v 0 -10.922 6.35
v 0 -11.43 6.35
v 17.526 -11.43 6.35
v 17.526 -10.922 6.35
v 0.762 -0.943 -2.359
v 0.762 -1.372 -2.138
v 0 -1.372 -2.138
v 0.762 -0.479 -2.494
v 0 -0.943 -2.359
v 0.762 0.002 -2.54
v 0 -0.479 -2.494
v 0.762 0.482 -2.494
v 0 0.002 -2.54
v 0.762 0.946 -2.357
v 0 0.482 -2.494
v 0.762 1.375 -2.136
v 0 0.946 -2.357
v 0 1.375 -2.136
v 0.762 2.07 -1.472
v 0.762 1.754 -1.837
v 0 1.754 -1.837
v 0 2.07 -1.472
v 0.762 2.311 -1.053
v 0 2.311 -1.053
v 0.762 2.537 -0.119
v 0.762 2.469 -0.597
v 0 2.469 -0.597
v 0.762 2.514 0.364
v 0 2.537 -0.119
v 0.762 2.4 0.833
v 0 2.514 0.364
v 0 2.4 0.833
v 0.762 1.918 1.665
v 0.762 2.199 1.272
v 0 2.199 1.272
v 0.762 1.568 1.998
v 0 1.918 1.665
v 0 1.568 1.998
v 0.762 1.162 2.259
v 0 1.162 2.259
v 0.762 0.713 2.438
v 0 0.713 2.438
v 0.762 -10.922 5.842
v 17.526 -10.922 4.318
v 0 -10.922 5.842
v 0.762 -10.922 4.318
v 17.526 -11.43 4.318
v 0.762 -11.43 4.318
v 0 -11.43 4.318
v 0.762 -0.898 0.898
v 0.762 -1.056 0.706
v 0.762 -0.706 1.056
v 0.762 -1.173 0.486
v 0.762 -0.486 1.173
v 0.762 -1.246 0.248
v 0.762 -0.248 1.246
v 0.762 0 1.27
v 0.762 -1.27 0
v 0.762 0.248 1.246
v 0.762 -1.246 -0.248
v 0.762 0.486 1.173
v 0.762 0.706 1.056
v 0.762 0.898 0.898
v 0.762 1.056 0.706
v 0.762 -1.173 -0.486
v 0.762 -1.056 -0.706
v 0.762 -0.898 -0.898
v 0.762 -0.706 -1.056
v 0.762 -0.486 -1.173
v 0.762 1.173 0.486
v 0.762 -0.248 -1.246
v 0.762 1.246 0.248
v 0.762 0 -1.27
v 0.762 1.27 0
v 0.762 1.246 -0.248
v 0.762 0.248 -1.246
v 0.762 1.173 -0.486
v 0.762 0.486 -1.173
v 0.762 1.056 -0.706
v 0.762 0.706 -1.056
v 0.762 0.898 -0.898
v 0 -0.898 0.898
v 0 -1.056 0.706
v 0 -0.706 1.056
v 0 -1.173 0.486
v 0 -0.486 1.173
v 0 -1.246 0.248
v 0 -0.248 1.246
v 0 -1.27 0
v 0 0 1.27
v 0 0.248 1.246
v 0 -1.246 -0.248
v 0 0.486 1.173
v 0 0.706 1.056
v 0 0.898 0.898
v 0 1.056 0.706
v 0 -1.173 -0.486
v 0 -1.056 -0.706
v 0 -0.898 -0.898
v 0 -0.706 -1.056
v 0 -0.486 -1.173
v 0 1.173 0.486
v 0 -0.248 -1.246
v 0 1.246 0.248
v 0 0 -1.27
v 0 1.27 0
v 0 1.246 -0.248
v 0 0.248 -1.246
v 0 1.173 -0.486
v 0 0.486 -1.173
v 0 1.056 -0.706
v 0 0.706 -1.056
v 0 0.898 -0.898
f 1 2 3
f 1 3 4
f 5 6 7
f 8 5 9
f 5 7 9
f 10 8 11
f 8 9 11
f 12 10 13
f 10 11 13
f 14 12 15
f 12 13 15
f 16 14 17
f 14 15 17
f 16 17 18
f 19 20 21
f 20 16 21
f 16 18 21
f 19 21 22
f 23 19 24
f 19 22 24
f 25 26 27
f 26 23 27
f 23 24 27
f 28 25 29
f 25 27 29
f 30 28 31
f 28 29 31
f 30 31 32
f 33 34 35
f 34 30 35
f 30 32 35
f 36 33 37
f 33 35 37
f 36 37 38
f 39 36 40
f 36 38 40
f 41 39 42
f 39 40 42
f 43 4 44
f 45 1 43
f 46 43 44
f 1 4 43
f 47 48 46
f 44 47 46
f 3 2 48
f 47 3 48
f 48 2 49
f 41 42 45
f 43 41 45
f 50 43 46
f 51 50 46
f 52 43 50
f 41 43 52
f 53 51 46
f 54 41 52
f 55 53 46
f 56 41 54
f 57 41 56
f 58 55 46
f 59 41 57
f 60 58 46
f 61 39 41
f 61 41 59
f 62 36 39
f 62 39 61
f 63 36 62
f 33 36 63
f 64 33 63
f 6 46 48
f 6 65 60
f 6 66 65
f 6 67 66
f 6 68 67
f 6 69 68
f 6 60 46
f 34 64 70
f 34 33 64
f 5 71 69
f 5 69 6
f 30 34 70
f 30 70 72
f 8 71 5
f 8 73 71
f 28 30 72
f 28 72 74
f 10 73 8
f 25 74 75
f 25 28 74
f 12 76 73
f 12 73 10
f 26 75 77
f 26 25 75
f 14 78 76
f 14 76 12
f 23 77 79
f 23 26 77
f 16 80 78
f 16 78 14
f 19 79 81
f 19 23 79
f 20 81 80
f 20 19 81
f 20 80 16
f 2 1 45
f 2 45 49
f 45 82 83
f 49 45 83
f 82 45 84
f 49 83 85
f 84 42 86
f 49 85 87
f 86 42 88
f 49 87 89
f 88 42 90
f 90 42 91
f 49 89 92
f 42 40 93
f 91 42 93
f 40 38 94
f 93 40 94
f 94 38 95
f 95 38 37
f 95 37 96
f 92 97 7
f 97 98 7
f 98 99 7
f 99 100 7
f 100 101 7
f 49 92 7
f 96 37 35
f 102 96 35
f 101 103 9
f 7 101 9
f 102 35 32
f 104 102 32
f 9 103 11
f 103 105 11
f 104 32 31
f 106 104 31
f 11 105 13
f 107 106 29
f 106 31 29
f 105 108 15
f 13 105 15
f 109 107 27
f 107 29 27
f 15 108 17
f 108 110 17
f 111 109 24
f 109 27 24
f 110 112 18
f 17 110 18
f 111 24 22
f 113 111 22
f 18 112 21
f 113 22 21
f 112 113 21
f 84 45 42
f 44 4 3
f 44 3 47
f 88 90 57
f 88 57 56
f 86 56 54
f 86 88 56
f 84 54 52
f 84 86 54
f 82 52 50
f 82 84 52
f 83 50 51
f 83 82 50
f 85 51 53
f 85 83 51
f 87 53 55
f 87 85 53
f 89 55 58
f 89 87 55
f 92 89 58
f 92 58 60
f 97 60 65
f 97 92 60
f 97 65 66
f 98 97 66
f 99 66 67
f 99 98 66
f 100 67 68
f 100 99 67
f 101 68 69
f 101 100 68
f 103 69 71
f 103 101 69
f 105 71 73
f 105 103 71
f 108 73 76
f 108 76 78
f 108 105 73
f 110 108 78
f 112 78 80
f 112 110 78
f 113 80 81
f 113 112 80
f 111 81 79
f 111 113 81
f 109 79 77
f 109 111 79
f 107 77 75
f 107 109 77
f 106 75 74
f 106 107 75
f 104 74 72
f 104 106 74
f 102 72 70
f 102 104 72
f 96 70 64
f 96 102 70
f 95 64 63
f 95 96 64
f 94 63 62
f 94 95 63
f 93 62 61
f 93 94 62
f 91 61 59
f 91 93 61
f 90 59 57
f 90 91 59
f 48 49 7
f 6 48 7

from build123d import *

# Parameters (mm, degrees)
BOSS_EXTRUDE1_DEPTH = 17.526
SKETCH1_3_R         = 1.27
BOSS_EXTRUDE2_DEPTH = 0.762


with BuildPart() as part:
    # Sketch1 → Boss-Extrude1 (new body)
    with BuildSketch(Plane(origin=(0, 0, 0), x_dir=(0, 0, -1), z_dir=(1, 0, 0))):
        Polygon((-6.35, -11.43), (-4.318, -11.43), (-4.318, -10.922), (-5.842, -10.922), (-6.35, -10.922), align=None)
    extrude(amount=BOSS_EXTRUDE1_DEPTH)

    # Sketch1<3> → Boss-Extrude2 (add)
    with BuildSketch(Plane(origin=(0, 0, 0), x_dir=(0, 0, -1), z_dir=(1, 0, 0))):
        with BuildLine():
            Line((-4.318, -11.43), (2.137587014, -1.371977316))
            ThreePointArc((2.137587014, -1.371977316), (1.053360752, 2.311283437), (-2.437803052, 0.713243493))
            Line((-2.437803052, 0.713243493), (-5.842, -10.922))
            Line((-5.842, -10.922), (-4.318, -10.922))
            Line((-4.318, -10.922), (-4.318, -11.43))
        make_face()
        Circle(SKETCH1_3_R, mode=Mode.SUBTRACT)
    extrude(amount=BOSS_EXTRUDE2_DEPTH)


solid = part.part
